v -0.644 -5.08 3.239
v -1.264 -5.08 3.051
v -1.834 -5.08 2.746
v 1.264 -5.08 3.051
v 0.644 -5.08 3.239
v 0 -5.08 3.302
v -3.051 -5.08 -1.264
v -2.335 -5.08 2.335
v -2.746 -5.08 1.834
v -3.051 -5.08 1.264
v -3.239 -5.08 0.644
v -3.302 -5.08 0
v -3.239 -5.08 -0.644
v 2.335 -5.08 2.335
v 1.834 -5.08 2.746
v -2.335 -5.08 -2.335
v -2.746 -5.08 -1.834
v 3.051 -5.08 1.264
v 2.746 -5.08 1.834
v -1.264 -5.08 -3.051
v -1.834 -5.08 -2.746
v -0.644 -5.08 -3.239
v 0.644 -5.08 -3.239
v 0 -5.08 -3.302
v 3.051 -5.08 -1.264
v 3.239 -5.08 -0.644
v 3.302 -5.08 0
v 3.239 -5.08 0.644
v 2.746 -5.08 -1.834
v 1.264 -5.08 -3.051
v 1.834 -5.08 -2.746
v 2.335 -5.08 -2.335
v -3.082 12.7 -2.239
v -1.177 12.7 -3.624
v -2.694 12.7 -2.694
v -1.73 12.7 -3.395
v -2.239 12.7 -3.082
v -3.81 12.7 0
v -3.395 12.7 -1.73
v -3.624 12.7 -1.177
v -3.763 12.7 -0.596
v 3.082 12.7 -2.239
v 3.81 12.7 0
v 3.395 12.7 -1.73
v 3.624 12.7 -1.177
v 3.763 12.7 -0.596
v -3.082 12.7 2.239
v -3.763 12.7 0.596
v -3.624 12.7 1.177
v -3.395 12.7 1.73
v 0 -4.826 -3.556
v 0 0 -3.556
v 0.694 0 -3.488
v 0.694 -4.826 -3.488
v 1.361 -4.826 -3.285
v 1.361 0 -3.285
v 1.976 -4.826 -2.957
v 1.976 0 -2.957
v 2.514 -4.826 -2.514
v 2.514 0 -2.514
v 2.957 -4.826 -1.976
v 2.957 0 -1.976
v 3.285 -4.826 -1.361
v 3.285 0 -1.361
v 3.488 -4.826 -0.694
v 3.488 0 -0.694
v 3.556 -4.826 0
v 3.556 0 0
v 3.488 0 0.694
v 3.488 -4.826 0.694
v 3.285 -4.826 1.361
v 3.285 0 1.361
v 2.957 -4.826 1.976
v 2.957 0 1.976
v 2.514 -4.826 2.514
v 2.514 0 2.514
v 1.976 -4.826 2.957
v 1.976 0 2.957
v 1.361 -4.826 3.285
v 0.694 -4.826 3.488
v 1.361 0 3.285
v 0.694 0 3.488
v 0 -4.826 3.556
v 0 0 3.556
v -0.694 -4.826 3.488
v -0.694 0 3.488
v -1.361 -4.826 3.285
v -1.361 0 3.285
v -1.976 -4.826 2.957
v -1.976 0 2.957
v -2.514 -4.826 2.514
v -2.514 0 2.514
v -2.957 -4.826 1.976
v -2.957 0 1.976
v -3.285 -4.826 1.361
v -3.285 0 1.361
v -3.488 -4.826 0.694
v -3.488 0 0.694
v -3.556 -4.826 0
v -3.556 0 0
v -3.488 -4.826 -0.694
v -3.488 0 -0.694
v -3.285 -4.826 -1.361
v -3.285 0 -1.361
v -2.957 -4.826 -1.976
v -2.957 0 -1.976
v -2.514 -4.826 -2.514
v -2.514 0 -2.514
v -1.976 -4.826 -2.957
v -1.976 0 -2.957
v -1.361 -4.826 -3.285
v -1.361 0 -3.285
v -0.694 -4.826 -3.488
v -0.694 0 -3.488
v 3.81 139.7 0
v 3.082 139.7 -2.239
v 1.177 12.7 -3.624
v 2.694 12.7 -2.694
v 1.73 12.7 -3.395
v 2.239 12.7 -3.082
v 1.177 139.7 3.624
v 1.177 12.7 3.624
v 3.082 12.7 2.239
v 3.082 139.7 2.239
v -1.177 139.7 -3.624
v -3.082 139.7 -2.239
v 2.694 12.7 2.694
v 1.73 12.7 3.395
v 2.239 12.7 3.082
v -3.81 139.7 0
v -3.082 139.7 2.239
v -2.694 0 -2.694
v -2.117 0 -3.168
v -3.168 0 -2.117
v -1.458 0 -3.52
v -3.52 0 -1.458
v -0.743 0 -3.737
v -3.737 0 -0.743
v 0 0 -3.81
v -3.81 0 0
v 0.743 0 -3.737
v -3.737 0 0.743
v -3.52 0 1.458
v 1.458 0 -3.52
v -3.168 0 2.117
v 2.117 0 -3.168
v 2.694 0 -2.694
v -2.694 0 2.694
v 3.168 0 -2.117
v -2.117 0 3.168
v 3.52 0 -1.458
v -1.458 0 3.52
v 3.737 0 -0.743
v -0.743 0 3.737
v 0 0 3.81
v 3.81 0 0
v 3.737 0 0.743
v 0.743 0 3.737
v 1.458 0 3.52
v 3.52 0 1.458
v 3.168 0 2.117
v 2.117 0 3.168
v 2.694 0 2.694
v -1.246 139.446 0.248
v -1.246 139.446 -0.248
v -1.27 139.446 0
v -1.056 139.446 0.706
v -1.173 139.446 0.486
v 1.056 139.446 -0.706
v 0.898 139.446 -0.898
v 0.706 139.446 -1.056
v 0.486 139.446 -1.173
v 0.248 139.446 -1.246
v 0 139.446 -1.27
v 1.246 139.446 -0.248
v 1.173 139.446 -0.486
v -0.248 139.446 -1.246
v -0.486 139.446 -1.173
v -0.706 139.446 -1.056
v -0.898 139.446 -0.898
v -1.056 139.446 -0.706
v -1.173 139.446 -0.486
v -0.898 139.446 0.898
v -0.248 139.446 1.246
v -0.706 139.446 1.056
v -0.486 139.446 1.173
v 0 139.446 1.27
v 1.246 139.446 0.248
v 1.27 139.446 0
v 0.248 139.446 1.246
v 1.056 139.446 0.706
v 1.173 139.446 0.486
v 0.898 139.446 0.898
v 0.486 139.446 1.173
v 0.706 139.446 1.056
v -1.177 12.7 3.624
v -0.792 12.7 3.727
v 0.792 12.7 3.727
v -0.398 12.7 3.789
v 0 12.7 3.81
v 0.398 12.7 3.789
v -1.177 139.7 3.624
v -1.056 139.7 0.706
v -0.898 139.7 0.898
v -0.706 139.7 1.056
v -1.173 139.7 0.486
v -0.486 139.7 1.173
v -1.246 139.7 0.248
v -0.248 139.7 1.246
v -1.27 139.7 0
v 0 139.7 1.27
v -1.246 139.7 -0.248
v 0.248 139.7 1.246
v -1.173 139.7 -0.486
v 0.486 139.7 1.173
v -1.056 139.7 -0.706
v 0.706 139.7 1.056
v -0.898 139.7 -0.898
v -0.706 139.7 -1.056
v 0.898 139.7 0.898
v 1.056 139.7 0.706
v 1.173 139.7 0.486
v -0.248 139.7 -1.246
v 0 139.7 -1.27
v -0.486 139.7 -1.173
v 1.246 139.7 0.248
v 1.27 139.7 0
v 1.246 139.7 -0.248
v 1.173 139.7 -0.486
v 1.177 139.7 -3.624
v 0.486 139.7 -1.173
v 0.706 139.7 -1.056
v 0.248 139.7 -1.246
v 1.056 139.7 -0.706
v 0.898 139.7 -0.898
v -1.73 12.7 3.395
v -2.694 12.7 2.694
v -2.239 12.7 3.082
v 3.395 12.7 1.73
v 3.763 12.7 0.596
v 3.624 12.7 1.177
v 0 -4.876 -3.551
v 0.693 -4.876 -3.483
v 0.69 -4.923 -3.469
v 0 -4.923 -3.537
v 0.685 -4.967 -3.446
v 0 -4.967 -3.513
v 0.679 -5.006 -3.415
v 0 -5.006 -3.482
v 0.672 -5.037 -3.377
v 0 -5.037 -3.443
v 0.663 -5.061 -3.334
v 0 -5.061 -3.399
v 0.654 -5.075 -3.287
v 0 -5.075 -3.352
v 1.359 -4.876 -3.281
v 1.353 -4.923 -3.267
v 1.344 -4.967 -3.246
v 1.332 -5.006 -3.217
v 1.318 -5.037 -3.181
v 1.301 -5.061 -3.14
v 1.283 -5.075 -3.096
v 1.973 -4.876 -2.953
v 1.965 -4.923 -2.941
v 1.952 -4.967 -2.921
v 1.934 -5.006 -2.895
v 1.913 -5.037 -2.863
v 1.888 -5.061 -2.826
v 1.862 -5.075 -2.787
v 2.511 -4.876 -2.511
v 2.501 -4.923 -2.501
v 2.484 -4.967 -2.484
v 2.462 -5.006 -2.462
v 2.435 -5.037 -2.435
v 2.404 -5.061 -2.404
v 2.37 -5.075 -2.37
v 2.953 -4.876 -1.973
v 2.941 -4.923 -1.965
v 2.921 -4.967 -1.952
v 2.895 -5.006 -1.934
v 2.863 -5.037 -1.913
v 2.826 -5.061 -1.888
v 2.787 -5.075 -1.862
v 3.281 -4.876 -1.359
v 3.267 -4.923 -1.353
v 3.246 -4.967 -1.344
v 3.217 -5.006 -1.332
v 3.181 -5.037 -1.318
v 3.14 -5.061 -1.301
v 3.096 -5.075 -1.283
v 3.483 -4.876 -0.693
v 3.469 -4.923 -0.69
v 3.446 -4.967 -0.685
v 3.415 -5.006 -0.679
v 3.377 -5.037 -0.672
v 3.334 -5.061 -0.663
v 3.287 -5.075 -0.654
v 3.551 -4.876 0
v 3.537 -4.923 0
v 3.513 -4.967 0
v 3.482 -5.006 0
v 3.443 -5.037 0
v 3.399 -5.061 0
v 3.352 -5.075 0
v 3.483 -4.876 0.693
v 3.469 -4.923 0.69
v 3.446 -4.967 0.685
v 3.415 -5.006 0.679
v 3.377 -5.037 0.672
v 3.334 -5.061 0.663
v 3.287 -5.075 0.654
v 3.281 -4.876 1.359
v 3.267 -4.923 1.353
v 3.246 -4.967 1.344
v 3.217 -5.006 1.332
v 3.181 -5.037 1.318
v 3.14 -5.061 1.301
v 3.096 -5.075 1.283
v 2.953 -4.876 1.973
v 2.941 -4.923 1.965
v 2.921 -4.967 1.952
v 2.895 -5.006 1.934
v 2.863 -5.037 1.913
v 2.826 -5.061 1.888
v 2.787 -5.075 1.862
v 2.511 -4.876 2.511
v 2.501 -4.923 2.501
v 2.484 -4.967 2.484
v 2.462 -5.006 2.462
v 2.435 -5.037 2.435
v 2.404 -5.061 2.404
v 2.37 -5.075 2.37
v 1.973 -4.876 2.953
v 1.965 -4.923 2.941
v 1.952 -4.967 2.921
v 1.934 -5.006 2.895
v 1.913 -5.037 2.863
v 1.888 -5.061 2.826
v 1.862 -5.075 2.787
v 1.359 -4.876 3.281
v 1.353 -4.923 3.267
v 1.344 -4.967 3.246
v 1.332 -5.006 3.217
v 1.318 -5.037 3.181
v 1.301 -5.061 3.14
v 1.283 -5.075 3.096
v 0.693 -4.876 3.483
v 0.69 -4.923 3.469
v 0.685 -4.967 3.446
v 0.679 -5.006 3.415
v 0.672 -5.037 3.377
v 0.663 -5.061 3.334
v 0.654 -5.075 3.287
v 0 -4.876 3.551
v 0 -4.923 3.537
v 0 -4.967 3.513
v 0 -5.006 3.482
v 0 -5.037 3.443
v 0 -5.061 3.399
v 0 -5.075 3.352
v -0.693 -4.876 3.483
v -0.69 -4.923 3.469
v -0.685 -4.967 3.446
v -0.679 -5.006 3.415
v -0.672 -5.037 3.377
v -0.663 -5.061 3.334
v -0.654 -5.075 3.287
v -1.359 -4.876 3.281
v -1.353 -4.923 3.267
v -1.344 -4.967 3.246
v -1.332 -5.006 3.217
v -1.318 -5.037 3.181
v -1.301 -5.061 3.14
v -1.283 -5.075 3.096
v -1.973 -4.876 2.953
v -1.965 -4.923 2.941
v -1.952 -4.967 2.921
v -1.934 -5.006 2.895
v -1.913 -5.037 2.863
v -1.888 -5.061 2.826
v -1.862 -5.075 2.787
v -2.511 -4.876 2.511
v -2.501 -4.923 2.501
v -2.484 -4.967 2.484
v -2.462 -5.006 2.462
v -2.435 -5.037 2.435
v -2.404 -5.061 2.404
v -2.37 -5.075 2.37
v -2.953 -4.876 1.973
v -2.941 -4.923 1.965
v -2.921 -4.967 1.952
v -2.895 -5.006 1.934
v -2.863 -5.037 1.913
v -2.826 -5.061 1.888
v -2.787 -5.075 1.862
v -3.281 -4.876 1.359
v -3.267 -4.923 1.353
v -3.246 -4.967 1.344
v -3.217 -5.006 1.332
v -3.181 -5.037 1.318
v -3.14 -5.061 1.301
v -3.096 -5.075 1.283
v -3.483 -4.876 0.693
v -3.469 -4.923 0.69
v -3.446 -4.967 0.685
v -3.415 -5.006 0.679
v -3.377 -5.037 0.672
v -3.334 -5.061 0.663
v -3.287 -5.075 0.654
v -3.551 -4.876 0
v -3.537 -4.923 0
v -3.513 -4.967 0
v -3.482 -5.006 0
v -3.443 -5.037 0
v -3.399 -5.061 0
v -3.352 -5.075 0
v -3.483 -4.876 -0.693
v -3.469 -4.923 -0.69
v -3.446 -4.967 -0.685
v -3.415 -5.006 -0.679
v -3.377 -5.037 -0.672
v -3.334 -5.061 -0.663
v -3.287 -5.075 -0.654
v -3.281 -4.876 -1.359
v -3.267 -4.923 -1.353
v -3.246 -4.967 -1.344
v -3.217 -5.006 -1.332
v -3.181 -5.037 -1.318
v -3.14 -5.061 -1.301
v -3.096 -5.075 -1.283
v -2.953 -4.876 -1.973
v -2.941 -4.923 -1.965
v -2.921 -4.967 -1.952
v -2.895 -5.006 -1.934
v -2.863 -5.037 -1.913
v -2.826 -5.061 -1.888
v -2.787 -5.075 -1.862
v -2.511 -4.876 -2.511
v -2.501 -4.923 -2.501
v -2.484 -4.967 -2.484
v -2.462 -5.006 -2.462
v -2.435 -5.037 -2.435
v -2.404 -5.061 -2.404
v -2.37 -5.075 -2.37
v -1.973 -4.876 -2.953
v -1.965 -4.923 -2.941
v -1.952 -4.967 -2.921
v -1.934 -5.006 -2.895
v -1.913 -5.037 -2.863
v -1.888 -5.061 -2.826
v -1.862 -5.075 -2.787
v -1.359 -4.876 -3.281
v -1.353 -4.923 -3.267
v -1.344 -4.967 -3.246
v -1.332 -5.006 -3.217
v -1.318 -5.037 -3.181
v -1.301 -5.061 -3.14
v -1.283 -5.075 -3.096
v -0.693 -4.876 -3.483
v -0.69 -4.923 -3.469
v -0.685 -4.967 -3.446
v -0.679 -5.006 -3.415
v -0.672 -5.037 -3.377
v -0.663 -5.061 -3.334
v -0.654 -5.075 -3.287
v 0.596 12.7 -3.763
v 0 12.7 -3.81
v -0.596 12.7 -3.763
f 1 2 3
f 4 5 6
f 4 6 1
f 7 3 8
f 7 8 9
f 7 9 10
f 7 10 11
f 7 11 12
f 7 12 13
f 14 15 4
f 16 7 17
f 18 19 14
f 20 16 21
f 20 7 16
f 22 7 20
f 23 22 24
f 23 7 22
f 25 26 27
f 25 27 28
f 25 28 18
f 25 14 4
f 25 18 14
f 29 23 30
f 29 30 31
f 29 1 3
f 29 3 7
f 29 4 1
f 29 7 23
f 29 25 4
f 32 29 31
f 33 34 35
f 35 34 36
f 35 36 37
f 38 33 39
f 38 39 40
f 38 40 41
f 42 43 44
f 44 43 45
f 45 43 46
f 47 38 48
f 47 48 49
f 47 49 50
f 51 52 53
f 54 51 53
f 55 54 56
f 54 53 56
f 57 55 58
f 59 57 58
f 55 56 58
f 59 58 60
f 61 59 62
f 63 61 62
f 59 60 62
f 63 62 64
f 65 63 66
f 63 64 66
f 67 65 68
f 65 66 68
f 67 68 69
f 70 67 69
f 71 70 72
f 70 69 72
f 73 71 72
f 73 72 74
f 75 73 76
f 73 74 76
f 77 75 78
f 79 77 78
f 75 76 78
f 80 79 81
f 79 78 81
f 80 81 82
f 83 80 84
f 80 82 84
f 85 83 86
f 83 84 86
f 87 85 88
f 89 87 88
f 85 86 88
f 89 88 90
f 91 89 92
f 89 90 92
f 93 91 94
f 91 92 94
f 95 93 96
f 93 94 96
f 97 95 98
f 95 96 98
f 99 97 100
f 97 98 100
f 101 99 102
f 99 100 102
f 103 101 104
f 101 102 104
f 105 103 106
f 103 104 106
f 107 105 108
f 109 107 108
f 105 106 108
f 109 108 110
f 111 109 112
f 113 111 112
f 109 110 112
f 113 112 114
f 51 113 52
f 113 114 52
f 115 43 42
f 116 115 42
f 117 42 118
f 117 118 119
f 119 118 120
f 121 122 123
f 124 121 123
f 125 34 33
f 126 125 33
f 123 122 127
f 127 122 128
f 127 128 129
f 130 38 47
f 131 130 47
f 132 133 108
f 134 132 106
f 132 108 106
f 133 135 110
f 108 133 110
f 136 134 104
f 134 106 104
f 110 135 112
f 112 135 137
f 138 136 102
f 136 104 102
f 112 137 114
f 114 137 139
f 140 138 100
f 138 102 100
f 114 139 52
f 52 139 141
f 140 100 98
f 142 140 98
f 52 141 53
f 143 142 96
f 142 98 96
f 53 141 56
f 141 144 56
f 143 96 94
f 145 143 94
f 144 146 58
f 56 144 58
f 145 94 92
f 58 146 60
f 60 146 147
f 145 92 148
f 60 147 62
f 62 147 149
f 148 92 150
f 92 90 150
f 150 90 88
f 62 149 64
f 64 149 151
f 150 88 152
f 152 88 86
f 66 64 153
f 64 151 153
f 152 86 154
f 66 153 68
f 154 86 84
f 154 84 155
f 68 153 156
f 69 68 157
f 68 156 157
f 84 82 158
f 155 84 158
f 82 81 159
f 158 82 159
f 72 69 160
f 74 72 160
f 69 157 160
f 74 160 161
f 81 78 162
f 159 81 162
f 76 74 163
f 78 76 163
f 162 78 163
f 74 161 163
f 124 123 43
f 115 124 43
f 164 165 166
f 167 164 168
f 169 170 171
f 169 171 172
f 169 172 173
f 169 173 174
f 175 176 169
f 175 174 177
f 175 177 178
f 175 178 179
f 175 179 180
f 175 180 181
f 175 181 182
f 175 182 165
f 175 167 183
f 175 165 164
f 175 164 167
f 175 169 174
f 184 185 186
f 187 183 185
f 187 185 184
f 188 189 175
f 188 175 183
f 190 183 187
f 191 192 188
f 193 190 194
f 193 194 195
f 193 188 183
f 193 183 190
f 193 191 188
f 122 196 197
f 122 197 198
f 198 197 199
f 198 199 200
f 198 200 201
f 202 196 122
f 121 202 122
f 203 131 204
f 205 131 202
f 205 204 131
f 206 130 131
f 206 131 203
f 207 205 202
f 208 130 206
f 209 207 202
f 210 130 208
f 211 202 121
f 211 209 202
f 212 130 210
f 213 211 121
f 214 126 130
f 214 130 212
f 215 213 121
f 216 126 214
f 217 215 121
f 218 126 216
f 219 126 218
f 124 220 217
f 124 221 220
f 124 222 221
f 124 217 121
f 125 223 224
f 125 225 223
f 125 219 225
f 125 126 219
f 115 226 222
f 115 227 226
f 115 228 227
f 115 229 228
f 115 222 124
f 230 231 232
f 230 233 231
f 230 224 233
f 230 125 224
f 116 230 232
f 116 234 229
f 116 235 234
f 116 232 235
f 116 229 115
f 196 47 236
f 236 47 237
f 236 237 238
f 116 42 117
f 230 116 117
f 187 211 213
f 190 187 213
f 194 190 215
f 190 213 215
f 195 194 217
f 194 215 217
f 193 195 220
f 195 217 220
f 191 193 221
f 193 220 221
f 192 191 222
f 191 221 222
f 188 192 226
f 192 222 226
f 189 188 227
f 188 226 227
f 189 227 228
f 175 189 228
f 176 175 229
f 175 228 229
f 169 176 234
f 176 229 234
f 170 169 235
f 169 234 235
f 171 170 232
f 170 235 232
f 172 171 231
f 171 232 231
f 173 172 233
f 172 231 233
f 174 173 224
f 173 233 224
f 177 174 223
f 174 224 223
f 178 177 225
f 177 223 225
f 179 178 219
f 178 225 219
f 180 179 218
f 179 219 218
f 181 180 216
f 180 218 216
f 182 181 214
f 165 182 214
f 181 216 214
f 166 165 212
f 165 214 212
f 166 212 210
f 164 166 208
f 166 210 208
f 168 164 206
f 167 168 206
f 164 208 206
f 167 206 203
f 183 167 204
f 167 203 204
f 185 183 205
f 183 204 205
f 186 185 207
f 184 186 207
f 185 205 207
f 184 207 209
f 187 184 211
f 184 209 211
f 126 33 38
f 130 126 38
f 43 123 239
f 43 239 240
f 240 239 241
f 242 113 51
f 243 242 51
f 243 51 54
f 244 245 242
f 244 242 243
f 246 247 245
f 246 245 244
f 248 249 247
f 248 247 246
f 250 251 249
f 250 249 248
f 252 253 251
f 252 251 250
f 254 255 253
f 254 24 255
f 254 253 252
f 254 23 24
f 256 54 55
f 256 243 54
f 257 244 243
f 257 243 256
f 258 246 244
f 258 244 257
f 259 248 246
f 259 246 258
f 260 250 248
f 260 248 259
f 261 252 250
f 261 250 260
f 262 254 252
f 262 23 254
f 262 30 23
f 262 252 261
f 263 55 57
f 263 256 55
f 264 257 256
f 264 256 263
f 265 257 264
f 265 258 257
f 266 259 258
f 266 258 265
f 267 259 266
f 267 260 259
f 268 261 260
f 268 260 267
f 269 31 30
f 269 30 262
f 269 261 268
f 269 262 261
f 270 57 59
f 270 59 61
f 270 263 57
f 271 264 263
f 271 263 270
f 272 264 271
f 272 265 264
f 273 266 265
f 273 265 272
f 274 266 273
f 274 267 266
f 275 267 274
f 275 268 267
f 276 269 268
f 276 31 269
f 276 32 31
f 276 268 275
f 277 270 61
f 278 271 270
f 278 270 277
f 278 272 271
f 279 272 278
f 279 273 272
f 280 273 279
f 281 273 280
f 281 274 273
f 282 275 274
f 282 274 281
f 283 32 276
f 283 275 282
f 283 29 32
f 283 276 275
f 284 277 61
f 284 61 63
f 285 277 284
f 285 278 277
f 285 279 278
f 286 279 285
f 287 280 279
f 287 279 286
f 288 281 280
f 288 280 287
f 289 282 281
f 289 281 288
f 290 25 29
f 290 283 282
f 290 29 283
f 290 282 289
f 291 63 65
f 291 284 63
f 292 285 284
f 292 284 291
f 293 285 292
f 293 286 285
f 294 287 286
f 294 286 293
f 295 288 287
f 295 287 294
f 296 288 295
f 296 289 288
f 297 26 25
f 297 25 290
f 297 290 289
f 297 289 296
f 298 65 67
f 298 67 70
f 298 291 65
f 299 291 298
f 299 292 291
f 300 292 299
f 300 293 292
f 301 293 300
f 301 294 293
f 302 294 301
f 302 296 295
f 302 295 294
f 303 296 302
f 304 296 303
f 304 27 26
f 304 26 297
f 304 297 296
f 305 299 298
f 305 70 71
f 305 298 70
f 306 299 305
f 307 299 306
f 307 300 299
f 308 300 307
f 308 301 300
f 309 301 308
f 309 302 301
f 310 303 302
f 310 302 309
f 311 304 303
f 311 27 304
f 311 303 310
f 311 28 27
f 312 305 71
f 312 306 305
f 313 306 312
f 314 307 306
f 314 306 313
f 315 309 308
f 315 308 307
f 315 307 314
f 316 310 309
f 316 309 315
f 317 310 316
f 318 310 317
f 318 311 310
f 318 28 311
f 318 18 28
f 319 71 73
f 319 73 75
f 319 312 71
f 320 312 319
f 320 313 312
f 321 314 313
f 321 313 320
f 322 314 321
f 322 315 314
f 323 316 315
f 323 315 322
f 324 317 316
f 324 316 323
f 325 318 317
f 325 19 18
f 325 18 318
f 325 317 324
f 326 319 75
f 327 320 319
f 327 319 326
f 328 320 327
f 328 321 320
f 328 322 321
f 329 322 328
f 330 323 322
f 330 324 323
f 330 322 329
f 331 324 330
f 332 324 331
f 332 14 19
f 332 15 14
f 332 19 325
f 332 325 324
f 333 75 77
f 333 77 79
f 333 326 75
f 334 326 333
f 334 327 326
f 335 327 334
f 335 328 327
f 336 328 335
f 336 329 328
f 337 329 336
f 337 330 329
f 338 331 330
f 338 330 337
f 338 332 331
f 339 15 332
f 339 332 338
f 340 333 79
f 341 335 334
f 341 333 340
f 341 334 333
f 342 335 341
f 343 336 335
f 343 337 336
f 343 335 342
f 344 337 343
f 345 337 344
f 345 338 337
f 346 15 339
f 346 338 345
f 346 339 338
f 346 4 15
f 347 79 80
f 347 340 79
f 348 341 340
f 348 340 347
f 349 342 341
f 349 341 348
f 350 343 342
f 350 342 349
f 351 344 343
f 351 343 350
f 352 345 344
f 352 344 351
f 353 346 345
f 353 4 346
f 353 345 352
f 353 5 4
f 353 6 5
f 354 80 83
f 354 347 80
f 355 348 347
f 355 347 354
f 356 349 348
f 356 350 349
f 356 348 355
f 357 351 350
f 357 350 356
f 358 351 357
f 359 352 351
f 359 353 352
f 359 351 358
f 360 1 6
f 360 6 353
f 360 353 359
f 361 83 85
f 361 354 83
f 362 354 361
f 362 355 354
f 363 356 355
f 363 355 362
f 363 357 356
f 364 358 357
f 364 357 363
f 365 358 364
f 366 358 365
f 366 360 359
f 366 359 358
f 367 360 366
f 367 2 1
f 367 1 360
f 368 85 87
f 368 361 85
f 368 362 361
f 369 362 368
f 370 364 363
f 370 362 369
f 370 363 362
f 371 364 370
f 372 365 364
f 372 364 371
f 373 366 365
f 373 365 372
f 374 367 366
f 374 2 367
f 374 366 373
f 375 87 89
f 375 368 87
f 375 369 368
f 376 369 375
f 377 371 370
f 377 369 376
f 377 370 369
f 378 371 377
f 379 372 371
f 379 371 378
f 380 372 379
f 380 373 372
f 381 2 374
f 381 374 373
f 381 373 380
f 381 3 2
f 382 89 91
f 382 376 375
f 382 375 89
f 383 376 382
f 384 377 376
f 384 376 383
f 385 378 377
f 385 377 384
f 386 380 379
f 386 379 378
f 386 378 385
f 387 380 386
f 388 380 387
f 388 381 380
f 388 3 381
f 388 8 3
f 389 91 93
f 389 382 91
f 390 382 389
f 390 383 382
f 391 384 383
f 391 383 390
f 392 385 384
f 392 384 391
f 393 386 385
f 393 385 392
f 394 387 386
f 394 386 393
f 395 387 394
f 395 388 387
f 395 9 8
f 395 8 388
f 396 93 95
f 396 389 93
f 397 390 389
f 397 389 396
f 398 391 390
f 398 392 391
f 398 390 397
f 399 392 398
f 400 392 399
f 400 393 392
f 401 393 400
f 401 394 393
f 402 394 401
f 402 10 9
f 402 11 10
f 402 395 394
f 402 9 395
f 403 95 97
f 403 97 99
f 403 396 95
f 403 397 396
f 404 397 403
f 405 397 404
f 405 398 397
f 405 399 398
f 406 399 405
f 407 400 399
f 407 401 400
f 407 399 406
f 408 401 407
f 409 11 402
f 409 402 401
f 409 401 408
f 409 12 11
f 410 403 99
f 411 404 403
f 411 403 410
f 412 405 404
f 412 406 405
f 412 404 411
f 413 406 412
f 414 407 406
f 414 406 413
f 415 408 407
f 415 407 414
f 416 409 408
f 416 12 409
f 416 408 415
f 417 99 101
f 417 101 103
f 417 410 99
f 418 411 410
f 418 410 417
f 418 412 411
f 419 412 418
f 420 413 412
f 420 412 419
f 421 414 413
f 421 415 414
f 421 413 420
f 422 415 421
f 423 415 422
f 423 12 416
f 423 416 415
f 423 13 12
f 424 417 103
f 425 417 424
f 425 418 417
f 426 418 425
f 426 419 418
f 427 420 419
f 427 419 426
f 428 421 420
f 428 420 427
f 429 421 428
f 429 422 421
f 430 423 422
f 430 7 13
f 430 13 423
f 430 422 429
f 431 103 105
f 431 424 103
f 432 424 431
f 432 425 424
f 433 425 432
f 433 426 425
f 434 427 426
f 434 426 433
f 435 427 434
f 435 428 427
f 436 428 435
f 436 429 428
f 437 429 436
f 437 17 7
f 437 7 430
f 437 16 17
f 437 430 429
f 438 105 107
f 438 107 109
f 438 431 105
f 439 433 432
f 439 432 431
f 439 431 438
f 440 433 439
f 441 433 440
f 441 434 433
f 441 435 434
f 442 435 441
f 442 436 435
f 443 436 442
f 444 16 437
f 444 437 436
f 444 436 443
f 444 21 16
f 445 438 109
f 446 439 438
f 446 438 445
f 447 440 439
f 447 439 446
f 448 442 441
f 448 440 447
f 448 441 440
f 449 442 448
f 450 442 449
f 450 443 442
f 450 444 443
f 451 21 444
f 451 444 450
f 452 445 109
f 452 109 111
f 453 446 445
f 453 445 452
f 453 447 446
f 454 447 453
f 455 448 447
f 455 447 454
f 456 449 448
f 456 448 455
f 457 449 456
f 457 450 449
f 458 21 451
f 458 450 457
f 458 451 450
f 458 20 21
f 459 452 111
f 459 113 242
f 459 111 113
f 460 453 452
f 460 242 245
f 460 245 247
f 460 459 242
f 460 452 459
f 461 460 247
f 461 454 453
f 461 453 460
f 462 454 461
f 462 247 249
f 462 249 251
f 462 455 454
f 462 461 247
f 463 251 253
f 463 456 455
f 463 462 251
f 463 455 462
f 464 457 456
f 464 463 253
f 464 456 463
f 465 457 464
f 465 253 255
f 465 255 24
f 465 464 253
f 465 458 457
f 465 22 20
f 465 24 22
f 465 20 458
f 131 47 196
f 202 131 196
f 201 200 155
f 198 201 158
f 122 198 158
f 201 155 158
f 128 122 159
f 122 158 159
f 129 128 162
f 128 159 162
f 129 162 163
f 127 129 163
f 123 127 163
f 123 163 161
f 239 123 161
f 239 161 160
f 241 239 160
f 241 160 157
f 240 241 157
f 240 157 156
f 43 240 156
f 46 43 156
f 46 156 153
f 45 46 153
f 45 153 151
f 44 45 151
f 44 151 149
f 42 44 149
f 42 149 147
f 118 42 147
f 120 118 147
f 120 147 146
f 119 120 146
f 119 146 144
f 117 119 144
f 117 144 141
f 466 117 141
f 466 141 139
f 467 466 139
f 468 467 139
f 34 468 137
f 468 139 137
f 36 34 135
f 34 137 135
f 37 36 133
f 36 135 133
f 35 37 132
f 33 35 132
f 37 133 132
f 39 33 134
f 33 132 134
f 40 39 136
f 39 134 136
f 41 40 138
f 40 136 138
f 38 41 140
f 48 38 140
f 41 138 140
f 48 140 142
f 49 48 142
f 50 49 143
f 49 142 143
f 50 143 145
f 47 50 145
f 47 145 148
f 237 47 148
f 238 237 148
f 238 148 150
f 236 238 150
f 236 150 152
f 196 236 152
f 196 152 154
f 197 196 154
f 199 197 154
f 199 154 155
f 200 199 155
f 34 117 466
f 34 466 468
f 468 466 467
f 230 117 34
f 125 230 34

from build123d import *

# Parameters (mm, degrees)
SKETCH2_R           = 3.81
BOSS_EXTRUDE1_DEPTH = 12.7
BOSS_EXTRUDE2_DEPTH = 127
SKETCH4_R           = 3.556
BOSS_EXTRUDE3_DEPTH = 5.08
FILLET3_R           = 0.254
SKETCH5_R           = 1.27
CUT_EXTRUDE1_DEPTH  = 0.254


with BuildPart() as part:
    # Sketch2 → Boss-Extrude1 (new body)
    with BuildSketch(Plane(origin=(0, 0, 0), x_dir=(1, 0, 0), z_dir=(0, 1, 0))):
        with Locations(Location((0, 0, 0), (0, 0, 270))):
            Circle(SKETCH2_R)
    extrude(amount=BOSS_EXTRUDE1_DEPTH)

    # Sketch3 → Boss-Extrude2 (add)
    with BuildSketch(Plane(origin=(0, 12.7, 0), x_dir=(1, 0, 0), z_dir=(0, 1, 0))):
        Polygon((3.81, 0), (3.082354749, 2.239461811), (1.177354749, 3.623525327), (-1.177354749, 3.623525327), (-3.082354749, 2.239461811), (-3.81, 0), (-3.082354749, -2.239461811), (-1.177354749, -3.623525327), (1.177354749, -3.623525327), (3.082354749, -2.239461811), align=None)
    extrude(amount=BOSS_EXTRUDE2_DEPTH)

    # Sketch4 → Boss-Extrude3 (add)
    with BuildSketch(Plane.XZ):
        with Locations(Location((0, 0, 0), (0, 0, 270))):
            Circle(SKETCH4_R)
    extrude(amount=BOSS_EXTRUDE3_DEPTH)

    # Fillet3
    fillet3_edges = [part.edges().sort_by_distance(p)[0] for p in [
        (0, -5.08, 3.556),
    ]]
    fillet(fillet3_edges, radius=FILLET3_R)

    # Sketch5 → Cut-Extrude1 (cut)
    with BuildSketch(Plane(origin=(0, 139.7, 0), x_dir=(1, 0, 0), z_dir=(0, 1, 0))):
        with Locations(Location((0, 0, 0), (0, 0, 270))):
            Circle(SKETCH5_R)
    extrude(amount=-CUT_EXTRUDE1_DEPTH, mode=Mode.SUBTRACT)


solid = part.part
